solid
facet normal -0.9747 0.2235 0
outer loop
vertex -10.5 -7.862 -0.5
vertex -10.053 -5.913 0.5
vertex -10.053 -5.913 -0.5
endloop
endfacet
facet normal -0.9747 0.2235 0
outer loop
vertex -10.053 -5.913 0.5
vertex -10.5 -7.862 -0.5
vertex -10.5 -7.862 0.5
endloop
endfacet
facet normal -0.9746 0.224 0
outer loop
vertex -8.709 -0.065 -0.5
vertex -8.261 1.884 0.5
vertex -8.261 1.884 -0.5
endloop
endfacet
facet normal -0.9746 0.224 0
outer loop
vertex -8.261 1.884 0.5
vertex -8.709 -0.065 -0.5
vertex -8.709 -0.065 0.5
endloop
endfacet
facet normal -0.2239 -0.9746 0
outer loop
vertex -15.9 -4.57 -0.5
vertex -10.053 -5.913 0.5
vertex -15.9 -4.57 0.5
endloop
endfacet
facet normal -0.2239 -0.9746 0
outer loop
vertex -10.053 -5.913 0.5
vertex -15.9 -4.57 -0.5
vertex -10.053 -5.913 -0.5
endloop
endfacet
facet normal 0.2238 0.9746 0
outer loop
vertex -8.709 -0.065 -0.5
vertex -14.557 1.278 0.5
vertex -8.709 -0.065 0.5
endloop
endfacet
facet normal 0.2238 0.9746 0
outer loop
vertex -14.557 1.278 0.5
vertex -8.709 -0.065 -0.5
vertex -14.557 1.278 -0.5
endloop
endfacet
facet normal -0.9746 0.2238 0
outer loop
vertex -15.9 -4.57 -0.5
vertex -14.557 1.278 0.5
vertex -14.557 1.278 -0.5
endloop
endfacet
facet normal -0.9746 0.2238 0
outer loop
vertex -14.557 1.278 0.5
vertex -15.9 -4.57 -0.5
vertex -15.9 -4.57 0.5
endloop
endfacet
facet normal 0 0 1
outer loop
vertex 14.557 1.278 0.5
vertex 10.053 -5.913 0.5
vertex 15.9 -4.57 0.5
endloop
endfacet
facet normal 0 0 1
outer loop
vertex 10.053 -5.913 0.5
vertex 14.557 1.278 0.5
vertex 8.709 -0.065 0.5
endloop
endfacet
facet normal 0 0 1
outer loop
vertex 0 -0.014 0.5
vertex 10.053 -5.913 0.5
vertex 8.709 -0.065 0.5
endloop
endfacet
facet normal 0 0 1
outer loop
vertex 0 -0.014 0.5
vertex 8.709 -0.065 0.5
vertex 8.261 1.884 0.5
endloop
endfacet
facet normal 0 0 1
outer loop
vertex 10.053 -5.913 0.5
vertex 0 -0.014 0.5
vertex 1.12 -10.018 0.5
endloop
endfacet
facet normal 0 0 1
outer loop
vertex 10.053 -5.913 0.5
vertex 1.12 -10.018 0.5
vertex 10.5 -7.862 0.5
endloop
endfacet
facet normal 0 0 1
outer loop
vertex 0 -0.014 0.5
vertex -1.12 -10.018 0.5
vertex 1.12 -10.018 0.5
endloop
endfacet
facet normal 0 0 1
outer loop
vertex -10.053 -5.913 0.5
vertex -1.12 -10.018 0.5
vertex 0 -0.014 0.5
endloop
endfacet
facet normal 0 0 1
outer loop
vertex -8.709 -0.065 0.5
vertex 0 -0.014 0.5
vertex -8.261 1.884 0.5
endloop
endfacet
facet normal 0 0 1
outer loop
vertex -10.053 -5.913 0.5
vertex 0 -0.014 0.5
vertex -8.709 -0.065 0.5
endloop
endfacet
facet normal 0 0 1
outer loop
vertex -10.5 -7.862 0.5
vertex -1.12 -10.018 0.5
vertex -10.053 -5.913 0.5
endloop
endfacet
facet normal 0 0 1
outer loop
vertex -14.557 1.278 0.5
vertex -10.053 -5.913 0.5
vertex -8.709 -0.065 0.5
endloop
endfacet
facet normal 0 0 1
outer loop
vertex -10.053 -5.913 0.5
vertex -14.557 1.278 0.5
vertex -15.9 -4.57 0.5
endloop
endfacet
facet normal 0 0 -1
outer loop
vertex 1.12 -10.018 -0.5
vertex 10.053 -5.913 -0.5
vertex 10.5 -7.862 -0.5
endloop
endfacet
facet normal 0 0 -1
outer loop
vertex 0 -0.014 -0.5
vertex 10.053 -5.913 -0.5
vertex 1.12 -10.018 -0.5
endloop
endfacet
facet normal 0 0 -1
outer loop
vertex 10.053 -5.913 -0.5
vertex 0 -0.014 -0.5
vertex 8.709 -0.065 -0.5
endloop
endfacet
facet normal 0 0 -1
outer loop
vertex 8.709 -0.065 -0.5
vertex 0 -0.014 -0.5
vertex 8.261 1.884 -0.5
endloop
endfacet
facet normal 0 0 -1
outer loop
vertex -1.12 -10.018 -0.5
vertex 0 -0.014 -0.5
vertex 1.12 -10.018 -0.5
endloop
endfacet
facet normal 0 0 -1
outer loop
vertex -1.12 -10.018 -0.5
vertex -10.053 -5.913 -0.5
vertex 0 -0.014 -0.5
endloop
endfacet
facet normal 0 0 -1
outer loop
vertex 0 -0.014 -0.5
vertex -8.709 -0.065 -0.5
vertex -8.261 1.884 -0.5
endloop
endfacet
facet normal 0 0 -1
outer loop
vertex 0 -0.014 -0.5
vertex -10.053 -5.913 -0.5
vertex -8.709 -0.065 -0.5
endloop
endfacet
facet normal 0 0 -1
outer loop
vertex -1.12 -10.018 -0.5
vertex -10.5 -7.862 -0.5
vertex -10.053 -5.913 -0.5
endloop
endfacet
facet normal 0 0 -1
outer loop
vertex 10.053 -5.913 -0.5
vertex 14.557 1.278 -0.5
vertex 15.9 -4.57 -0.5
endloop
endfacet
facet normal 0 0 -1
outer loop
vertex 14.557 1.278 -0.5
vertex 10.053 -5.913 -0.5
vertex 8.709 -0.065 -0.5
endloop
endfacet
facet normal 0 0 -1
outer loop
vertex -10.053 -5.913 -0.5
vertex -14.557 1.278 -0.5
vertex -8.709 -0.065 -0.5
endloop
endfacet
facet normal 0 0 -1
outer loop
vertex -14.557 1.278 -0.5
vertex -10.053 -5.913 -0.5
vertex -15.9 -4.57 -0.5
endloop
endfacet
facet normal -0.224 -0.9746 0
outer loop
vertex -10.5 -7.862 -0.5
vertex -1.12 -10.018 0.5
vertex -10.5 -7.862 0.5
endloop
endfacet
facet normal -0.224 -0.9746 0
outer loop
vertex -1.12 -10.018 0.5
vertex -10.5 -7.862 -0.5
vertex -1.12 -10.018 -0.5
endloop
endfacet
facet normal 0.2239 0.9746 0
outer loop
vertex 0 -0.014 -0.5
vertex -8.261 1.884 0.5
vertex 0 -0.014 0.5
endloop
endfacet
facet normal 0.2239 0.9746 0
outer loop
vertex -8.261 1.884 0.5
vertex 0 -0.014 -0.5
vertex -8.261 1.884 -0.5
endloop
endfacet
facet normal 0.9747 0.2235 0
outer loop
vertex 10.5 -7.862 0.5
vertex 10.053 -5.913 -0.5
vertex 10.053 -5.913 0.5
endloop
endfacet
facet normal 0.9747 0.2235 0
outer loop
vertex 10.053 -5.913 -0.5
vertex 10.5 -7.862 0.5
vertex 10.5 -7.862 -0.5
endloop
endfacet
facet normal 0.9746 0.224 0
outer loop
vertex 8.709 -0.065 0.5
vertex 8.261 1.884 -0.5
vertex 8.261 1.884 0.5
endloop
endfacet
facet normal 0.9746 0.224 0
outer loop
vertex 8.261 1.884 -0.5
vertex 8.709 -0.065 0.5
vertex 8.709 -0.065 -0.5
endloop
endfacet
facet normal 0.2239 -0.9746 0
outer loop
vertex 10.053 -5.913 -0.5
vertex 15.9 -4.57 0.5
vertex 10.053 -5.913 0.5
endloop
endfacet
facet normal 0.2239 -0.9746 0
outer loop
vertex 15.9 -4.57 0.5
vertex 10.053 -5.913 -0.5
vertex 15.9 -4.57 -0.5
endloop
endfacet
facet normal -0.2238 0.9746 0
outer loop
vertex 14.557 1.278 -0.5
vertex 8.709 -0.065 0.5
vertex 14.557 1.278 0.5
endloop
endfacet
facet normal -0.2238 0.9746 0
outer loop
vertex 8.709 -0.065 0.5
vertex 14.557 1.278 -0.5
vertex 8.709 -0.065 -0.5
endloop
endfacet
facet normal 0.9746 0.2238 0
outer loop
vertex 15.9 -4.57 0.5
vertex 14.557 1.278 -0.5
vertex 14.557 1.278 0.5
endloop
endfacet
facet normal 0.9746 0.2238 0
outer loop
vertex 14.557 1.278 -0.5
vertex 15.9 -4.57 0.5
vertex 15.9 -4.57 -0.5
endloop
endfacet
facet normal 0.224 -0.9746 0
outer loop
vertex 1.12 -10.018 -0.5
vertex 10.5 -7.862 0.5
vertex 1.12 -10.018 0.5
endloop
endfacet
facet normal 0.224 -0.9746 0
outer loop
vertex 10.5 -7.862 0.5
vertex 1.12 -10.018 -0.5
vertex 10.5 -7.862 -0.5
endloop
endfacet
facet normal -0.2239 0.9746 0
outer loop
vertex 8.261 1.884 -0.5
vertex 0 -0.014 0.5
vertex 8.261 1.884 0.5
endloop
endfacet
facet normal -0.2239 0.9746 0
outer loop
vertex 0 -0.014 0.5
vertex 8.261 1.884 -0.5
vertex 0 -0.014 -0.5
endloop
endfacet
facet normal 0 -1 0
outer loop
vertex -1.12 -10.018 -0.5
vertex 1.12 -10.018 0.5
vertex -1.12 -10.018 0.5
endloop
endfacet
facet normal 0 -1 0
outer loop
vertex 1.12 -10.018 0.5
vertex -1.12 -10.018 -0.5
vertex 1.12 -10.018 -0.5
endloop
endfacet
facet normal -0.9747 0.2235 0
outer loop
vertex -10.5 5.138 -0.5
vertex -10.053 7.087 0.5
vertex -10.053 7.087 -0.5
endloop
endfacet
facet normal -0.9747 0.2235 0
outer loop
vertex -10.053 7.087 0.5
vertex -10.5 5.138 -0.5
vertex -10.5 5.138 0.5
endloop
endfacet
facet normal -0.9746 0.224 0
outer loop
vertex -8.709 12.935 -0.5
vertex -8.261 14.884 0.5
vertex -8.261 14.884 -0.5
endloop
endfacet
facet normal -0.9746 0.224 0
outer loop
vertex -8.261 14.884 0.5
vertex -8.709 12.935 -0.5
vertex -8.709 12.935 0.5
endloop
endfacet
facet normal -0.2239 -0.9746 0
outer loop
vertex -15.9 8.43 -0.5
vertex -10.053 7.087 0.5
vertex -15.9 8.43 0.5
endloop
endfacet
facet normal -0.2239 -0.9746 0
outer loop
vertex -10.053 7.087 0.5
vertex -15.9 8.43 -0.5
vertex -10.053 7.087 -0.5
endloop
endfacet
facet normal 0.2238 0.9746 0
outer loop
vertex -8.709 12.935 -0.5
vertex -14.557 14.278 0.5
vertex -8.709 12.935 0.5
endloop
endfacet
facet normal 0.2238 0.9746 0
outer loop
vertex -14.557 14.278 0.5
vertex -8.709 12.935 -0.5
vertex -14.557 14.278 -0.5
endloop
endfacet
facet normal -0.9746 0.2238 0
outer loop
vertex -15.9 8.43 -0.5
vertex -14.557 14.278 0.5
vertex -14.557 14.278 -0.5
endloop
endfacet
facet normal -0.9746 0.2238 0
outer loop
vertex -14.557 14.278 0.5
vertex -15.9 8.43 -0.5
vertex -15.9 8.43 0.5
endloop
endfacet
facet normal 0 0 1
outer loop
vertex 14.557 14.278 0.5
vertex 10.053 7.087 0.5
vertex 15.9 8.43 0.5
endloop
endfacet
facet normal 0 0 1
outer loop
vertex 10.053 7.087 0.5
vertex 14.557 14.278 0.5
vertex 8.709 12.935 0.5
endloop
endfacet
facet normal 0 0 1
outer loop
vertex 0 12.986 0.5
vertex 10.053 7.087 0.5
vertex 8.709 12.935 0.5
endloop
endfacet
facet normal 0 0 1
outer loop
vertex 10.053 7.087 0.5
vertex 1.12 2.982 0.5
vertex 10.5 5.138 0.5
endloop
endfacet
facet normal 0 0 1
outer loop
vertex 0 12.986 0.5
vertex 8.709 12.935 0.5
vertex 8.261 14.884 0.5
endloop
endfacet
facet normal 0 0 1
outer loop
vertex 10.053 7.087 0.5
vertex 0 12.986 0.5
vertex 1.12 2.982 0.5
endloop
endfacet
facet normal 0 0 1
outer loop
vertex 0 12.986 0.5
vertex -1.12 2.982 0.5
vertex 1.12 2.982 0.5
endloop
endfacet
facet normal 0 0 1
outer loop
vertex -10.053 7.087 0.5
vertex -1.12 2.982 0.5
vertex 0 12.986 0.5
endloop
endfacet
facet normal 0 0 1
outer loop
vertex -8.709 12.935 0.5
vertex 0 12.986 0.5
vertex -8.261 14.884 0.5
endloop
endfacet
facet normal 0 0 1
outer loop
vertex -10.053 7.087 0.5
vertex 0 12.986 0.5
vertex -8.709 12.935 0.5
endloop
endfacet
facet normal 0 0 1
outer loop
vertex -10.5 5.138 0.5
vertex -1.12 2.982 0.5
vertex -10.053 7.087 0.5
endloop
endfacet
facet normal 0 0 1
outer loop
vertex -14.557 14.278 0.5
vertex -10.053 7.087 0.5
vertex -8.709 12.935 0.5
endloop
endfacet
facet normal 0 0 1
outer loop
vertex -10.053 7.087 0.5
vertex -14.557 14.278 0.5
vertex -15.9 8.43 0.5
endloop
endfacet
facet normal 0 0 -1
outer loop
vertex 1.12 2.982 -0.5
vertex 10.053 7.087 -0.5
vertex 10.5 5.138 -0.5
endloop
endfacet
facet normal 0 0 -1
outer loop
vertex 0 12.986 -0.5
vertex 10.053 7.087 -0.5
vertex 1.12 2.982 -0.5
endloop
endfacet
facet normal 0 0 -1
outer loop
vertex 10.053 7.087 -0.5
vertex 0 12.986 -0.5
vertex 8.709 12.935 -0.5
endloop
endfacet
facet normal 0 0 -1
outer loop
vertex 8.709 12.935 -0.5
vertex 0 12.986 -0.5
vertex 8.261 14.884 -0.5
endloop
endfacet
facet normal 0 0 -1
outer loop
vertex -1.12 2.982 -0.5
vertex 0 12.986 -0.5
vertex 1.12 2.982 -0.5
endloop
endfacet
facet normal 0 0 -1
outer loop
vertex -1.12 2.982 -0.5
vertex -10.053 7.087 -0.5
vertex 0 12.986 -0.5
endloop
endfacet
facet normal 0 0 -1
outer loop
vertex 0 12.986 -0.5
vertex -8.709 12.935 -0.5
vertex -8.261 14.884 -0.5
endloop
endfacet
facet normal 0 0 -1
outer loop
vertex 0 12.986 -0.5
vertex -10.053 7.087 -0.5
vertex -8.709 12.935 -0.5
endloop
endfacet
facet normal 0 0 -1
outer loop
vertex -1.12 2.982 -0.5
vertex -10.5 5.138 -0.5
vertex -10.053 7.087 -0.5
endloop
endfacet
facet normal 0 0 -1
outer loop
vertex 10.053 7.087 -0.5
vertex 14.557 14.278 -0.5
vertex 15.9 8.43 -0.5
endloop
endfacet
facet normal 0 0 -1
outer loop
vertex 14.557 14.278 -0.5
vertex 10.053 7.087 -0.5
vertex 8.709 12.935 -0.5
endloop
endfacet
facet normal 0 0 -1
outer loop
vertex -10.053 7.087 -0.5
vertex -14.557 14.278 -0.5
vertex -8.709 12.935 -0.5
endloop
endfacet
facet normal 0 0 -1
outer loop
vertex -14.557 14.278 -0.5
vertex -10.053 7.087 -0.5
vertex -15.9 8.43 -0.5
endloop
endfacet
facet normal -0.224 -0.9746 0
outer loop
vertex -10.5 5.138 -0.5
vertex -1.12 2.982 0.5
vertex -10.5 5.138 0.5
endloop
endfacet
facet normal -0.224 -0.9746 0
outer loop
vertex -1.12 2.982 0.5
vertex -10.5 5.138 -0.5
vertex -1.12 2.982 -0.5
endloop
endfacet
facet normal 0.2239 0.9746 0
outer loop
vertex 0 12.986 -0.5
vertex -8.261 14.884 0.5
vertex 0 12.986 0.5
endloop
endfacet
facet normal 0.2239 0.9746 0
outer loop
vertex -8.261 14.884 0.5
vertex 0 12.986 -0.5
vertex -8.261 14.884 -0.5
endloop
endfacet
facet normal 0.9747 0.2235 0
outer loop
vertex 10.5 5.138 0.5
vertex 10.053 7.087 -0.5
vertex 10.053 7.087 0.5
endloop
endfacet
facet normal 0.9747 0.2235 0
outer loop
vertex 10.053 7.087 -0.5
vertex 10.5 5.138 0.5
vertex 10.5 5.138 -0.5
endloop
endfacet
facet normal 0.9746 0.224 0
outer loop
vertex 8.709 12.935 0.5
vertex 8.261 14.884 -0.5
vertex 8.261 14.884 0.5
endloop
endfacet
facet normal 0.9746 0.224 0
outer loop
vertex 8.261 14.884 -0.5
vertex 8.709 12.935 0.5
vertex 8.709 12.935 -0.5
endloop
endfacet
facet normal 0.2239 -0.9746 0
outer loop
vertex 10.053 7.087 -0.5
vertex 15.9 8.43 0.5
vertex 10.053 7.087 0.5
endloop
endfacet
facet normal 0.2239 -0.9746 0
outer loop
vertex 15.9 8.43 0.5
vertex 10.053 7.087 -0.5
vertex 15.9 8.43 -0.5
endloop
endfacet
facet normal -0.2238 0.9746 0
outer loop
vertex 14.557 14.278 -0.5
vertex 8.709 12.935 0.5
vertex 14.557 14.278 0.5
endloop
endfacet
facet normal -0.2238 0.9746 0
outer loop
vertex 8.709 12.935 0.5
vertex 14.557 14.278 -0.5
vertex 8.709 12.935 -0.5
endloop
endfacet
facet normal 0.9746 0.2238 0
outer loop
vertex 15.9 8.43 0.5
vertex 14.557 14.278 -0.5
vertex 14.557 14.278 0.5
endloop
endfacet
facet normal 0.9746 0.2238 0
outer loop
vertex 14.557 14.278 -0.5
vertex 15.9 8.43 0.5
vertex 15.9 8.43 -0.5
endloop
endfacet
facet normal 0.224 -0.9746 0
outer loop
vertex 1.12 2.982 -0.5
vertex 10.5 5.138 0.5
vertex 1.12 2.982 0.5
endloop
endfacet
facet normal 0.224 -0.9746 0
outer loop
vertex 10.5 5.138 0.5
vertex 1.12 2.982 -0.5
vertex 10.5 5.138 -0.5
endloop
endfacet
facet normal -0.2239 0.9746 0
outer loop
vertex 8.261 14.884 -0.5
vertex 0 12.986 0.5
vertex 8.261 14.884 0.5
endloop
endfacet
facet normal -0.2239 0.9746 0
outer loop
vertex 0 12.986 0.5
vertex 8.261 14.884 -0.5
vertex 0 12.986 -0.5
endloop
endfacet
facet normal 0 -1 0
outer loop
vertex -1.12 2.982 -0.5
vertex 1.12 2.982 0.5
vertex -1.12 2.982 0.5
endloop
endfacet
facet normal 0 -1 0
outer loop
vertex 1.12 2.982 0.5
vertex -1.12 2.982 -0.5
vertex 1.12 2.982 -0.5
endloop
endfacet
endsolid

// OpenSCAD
// Ssymmank lamp -- TWO CONNECTORS for a test print (check the keyed joint on a
// real star tile).  Both laid flat on the bed, spaced apart.
// Modules/params come from star.scad, so edits there propagate here.

include <star.scad>
SHOW_STAR = false;   // library mode: don't draw the lone star tile

for (i = [0, 1]) translate([0, i * 13, 0]) rotate([90, 0, 0]) connector();
